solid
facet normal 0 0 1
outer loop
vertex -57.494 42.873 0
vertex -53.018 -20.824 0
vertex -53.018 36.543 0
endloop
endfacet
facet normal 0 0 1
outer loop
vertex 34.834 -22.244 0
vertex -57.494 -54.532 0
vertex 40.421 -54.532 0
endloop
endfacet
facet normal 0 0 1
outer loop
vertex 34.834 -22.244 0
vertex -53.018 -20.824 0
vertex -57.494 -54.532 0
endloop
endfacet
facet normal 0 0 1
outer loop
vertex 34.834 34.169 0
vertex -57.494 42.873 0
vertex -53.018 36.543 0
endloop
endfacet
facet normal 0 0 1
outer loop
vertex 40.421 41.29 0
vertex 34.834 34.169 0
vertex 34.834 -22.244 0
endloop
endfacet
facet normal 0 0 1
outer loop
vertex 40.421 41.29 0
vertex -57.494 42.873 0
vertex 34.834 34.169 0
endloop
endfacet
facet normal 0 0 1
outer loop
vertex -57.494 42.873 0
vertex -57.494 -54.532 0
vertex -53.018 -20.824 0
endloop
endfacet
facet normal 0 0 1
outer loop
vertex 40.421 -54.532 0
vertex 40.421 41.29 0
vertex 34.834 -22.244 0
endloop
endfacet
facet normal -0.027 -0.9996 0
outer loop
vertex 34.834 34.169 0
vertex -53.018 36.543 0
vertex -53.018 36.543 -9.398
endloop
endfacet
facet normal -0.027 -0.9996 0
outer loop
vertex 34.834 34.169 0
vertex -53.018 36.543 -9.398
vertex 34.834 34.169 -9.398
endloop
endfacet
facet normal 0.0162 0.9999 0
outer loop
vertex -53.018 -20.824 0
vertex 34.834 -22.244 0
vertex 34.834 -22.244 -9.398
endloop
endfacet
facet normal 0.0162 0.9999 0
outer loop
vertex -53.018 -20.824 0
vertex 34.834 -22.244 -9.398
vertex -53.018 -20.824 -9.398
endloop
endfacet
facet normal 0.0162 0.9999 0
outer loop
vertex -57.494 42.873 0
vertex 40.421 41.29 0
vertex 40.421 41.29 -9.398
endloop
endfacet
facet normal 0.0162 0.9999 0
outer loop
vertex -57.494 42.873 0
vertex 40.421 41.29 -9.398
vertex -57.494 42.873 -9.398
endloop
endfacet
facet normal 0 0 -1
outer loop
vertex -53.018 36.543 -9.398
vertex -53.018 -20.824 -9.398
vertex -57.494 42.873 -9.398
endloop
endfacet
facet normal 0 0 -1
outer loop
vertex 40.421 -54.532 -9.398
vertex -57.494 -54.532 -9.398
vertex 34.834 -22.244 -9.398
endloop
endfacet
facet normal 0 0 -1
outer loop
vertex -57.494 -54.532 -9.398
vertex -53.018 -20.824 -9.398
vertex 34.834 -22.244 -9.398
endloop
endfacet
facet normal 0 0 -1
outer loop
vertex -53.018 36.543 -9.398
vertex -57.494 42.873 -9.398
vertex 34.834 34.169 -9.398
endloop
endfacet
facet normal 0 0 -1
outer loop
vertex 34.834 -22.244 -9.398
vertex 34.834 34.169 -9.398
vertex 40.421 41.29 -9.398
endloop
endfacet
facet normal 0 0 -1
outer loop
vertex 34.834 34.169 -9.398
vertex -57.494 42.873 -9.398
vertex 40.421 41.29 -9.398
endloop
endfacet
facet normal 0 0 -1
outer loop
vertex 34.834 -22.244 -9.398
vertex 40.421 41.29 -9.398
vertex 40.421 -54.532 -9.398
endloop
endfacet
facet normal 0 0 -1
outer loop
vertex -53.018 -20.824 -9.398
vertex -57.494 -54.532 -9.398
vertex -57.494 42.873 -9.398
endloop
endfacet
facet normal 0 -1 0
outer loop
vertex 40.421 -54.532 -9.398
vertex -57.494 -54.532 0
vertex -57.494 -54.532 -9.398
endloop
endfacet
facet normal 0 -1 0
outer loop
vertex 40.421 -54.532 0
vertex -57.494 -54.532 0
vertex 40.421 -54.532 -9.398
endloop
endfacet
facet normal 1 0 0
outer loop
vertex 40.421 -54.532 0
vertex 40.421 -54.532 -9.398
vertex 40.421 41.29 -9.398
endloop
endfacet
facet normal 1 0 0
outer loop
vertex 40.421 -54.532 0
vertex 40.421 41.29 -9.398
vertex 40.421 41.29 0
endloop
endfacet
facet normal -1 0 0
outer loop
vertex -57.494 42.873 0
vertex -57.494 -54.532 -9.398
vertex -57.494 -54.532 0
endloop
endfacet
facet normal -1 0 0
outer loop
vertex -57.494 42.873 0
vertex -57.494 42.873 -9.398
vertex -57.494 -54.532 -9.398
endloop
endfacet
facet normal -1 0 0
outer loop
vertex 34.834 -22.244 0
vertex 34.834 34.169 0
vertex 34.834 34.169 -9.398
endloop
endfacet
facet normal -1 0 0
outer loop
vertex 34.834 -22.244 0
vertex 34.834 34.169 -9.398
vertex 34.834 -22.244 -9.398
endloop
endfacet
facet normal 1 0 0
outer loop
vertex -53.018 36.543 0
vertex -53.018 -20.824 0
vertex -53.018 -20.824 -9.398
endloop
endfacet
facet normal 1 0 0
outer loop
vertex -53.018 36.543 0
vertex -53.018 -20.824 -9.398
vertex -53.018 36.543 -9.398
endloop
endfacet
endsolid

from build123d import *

# Parameters (mm, degrees)
F1_DEPTH  = 9.398
F1_FACE_W = 97.914338
F1_FACE_H = 9.398
F2_DEPTH  = 25.4


with BuildPart() as f1:
    # F0 (on Top) → F1 (new body)
    with BuildSketch(Plane.XY):
        Polygon((40.420551, 41.290432), (-57.493787, 42.872965), (-57.493787, -29.132366), (40.420551, -29.132366), (40.420551, 27.838886), align=None)
        Polygon((-53.017702, -20.82406), (-53.017702, 36.542833), (34.834471, 34.169026), (34.834471, -22.243964), align=None, mode=Mode.SUBTRACT)
    extrude(amount=-F1_DEPTH)

    # F1_face (on face) → F2 (join)
    with BuildSketch(Plane(origin=(-8.536618, -29.132366, -4.699), x_dir=(1, 0, 0), z_dir=(0, -1, 0))):
        Rectangle(F1_FACE_W, F1_FACE_H)
    extrude(amount=F2_DEPTH)


solid = f1.part
